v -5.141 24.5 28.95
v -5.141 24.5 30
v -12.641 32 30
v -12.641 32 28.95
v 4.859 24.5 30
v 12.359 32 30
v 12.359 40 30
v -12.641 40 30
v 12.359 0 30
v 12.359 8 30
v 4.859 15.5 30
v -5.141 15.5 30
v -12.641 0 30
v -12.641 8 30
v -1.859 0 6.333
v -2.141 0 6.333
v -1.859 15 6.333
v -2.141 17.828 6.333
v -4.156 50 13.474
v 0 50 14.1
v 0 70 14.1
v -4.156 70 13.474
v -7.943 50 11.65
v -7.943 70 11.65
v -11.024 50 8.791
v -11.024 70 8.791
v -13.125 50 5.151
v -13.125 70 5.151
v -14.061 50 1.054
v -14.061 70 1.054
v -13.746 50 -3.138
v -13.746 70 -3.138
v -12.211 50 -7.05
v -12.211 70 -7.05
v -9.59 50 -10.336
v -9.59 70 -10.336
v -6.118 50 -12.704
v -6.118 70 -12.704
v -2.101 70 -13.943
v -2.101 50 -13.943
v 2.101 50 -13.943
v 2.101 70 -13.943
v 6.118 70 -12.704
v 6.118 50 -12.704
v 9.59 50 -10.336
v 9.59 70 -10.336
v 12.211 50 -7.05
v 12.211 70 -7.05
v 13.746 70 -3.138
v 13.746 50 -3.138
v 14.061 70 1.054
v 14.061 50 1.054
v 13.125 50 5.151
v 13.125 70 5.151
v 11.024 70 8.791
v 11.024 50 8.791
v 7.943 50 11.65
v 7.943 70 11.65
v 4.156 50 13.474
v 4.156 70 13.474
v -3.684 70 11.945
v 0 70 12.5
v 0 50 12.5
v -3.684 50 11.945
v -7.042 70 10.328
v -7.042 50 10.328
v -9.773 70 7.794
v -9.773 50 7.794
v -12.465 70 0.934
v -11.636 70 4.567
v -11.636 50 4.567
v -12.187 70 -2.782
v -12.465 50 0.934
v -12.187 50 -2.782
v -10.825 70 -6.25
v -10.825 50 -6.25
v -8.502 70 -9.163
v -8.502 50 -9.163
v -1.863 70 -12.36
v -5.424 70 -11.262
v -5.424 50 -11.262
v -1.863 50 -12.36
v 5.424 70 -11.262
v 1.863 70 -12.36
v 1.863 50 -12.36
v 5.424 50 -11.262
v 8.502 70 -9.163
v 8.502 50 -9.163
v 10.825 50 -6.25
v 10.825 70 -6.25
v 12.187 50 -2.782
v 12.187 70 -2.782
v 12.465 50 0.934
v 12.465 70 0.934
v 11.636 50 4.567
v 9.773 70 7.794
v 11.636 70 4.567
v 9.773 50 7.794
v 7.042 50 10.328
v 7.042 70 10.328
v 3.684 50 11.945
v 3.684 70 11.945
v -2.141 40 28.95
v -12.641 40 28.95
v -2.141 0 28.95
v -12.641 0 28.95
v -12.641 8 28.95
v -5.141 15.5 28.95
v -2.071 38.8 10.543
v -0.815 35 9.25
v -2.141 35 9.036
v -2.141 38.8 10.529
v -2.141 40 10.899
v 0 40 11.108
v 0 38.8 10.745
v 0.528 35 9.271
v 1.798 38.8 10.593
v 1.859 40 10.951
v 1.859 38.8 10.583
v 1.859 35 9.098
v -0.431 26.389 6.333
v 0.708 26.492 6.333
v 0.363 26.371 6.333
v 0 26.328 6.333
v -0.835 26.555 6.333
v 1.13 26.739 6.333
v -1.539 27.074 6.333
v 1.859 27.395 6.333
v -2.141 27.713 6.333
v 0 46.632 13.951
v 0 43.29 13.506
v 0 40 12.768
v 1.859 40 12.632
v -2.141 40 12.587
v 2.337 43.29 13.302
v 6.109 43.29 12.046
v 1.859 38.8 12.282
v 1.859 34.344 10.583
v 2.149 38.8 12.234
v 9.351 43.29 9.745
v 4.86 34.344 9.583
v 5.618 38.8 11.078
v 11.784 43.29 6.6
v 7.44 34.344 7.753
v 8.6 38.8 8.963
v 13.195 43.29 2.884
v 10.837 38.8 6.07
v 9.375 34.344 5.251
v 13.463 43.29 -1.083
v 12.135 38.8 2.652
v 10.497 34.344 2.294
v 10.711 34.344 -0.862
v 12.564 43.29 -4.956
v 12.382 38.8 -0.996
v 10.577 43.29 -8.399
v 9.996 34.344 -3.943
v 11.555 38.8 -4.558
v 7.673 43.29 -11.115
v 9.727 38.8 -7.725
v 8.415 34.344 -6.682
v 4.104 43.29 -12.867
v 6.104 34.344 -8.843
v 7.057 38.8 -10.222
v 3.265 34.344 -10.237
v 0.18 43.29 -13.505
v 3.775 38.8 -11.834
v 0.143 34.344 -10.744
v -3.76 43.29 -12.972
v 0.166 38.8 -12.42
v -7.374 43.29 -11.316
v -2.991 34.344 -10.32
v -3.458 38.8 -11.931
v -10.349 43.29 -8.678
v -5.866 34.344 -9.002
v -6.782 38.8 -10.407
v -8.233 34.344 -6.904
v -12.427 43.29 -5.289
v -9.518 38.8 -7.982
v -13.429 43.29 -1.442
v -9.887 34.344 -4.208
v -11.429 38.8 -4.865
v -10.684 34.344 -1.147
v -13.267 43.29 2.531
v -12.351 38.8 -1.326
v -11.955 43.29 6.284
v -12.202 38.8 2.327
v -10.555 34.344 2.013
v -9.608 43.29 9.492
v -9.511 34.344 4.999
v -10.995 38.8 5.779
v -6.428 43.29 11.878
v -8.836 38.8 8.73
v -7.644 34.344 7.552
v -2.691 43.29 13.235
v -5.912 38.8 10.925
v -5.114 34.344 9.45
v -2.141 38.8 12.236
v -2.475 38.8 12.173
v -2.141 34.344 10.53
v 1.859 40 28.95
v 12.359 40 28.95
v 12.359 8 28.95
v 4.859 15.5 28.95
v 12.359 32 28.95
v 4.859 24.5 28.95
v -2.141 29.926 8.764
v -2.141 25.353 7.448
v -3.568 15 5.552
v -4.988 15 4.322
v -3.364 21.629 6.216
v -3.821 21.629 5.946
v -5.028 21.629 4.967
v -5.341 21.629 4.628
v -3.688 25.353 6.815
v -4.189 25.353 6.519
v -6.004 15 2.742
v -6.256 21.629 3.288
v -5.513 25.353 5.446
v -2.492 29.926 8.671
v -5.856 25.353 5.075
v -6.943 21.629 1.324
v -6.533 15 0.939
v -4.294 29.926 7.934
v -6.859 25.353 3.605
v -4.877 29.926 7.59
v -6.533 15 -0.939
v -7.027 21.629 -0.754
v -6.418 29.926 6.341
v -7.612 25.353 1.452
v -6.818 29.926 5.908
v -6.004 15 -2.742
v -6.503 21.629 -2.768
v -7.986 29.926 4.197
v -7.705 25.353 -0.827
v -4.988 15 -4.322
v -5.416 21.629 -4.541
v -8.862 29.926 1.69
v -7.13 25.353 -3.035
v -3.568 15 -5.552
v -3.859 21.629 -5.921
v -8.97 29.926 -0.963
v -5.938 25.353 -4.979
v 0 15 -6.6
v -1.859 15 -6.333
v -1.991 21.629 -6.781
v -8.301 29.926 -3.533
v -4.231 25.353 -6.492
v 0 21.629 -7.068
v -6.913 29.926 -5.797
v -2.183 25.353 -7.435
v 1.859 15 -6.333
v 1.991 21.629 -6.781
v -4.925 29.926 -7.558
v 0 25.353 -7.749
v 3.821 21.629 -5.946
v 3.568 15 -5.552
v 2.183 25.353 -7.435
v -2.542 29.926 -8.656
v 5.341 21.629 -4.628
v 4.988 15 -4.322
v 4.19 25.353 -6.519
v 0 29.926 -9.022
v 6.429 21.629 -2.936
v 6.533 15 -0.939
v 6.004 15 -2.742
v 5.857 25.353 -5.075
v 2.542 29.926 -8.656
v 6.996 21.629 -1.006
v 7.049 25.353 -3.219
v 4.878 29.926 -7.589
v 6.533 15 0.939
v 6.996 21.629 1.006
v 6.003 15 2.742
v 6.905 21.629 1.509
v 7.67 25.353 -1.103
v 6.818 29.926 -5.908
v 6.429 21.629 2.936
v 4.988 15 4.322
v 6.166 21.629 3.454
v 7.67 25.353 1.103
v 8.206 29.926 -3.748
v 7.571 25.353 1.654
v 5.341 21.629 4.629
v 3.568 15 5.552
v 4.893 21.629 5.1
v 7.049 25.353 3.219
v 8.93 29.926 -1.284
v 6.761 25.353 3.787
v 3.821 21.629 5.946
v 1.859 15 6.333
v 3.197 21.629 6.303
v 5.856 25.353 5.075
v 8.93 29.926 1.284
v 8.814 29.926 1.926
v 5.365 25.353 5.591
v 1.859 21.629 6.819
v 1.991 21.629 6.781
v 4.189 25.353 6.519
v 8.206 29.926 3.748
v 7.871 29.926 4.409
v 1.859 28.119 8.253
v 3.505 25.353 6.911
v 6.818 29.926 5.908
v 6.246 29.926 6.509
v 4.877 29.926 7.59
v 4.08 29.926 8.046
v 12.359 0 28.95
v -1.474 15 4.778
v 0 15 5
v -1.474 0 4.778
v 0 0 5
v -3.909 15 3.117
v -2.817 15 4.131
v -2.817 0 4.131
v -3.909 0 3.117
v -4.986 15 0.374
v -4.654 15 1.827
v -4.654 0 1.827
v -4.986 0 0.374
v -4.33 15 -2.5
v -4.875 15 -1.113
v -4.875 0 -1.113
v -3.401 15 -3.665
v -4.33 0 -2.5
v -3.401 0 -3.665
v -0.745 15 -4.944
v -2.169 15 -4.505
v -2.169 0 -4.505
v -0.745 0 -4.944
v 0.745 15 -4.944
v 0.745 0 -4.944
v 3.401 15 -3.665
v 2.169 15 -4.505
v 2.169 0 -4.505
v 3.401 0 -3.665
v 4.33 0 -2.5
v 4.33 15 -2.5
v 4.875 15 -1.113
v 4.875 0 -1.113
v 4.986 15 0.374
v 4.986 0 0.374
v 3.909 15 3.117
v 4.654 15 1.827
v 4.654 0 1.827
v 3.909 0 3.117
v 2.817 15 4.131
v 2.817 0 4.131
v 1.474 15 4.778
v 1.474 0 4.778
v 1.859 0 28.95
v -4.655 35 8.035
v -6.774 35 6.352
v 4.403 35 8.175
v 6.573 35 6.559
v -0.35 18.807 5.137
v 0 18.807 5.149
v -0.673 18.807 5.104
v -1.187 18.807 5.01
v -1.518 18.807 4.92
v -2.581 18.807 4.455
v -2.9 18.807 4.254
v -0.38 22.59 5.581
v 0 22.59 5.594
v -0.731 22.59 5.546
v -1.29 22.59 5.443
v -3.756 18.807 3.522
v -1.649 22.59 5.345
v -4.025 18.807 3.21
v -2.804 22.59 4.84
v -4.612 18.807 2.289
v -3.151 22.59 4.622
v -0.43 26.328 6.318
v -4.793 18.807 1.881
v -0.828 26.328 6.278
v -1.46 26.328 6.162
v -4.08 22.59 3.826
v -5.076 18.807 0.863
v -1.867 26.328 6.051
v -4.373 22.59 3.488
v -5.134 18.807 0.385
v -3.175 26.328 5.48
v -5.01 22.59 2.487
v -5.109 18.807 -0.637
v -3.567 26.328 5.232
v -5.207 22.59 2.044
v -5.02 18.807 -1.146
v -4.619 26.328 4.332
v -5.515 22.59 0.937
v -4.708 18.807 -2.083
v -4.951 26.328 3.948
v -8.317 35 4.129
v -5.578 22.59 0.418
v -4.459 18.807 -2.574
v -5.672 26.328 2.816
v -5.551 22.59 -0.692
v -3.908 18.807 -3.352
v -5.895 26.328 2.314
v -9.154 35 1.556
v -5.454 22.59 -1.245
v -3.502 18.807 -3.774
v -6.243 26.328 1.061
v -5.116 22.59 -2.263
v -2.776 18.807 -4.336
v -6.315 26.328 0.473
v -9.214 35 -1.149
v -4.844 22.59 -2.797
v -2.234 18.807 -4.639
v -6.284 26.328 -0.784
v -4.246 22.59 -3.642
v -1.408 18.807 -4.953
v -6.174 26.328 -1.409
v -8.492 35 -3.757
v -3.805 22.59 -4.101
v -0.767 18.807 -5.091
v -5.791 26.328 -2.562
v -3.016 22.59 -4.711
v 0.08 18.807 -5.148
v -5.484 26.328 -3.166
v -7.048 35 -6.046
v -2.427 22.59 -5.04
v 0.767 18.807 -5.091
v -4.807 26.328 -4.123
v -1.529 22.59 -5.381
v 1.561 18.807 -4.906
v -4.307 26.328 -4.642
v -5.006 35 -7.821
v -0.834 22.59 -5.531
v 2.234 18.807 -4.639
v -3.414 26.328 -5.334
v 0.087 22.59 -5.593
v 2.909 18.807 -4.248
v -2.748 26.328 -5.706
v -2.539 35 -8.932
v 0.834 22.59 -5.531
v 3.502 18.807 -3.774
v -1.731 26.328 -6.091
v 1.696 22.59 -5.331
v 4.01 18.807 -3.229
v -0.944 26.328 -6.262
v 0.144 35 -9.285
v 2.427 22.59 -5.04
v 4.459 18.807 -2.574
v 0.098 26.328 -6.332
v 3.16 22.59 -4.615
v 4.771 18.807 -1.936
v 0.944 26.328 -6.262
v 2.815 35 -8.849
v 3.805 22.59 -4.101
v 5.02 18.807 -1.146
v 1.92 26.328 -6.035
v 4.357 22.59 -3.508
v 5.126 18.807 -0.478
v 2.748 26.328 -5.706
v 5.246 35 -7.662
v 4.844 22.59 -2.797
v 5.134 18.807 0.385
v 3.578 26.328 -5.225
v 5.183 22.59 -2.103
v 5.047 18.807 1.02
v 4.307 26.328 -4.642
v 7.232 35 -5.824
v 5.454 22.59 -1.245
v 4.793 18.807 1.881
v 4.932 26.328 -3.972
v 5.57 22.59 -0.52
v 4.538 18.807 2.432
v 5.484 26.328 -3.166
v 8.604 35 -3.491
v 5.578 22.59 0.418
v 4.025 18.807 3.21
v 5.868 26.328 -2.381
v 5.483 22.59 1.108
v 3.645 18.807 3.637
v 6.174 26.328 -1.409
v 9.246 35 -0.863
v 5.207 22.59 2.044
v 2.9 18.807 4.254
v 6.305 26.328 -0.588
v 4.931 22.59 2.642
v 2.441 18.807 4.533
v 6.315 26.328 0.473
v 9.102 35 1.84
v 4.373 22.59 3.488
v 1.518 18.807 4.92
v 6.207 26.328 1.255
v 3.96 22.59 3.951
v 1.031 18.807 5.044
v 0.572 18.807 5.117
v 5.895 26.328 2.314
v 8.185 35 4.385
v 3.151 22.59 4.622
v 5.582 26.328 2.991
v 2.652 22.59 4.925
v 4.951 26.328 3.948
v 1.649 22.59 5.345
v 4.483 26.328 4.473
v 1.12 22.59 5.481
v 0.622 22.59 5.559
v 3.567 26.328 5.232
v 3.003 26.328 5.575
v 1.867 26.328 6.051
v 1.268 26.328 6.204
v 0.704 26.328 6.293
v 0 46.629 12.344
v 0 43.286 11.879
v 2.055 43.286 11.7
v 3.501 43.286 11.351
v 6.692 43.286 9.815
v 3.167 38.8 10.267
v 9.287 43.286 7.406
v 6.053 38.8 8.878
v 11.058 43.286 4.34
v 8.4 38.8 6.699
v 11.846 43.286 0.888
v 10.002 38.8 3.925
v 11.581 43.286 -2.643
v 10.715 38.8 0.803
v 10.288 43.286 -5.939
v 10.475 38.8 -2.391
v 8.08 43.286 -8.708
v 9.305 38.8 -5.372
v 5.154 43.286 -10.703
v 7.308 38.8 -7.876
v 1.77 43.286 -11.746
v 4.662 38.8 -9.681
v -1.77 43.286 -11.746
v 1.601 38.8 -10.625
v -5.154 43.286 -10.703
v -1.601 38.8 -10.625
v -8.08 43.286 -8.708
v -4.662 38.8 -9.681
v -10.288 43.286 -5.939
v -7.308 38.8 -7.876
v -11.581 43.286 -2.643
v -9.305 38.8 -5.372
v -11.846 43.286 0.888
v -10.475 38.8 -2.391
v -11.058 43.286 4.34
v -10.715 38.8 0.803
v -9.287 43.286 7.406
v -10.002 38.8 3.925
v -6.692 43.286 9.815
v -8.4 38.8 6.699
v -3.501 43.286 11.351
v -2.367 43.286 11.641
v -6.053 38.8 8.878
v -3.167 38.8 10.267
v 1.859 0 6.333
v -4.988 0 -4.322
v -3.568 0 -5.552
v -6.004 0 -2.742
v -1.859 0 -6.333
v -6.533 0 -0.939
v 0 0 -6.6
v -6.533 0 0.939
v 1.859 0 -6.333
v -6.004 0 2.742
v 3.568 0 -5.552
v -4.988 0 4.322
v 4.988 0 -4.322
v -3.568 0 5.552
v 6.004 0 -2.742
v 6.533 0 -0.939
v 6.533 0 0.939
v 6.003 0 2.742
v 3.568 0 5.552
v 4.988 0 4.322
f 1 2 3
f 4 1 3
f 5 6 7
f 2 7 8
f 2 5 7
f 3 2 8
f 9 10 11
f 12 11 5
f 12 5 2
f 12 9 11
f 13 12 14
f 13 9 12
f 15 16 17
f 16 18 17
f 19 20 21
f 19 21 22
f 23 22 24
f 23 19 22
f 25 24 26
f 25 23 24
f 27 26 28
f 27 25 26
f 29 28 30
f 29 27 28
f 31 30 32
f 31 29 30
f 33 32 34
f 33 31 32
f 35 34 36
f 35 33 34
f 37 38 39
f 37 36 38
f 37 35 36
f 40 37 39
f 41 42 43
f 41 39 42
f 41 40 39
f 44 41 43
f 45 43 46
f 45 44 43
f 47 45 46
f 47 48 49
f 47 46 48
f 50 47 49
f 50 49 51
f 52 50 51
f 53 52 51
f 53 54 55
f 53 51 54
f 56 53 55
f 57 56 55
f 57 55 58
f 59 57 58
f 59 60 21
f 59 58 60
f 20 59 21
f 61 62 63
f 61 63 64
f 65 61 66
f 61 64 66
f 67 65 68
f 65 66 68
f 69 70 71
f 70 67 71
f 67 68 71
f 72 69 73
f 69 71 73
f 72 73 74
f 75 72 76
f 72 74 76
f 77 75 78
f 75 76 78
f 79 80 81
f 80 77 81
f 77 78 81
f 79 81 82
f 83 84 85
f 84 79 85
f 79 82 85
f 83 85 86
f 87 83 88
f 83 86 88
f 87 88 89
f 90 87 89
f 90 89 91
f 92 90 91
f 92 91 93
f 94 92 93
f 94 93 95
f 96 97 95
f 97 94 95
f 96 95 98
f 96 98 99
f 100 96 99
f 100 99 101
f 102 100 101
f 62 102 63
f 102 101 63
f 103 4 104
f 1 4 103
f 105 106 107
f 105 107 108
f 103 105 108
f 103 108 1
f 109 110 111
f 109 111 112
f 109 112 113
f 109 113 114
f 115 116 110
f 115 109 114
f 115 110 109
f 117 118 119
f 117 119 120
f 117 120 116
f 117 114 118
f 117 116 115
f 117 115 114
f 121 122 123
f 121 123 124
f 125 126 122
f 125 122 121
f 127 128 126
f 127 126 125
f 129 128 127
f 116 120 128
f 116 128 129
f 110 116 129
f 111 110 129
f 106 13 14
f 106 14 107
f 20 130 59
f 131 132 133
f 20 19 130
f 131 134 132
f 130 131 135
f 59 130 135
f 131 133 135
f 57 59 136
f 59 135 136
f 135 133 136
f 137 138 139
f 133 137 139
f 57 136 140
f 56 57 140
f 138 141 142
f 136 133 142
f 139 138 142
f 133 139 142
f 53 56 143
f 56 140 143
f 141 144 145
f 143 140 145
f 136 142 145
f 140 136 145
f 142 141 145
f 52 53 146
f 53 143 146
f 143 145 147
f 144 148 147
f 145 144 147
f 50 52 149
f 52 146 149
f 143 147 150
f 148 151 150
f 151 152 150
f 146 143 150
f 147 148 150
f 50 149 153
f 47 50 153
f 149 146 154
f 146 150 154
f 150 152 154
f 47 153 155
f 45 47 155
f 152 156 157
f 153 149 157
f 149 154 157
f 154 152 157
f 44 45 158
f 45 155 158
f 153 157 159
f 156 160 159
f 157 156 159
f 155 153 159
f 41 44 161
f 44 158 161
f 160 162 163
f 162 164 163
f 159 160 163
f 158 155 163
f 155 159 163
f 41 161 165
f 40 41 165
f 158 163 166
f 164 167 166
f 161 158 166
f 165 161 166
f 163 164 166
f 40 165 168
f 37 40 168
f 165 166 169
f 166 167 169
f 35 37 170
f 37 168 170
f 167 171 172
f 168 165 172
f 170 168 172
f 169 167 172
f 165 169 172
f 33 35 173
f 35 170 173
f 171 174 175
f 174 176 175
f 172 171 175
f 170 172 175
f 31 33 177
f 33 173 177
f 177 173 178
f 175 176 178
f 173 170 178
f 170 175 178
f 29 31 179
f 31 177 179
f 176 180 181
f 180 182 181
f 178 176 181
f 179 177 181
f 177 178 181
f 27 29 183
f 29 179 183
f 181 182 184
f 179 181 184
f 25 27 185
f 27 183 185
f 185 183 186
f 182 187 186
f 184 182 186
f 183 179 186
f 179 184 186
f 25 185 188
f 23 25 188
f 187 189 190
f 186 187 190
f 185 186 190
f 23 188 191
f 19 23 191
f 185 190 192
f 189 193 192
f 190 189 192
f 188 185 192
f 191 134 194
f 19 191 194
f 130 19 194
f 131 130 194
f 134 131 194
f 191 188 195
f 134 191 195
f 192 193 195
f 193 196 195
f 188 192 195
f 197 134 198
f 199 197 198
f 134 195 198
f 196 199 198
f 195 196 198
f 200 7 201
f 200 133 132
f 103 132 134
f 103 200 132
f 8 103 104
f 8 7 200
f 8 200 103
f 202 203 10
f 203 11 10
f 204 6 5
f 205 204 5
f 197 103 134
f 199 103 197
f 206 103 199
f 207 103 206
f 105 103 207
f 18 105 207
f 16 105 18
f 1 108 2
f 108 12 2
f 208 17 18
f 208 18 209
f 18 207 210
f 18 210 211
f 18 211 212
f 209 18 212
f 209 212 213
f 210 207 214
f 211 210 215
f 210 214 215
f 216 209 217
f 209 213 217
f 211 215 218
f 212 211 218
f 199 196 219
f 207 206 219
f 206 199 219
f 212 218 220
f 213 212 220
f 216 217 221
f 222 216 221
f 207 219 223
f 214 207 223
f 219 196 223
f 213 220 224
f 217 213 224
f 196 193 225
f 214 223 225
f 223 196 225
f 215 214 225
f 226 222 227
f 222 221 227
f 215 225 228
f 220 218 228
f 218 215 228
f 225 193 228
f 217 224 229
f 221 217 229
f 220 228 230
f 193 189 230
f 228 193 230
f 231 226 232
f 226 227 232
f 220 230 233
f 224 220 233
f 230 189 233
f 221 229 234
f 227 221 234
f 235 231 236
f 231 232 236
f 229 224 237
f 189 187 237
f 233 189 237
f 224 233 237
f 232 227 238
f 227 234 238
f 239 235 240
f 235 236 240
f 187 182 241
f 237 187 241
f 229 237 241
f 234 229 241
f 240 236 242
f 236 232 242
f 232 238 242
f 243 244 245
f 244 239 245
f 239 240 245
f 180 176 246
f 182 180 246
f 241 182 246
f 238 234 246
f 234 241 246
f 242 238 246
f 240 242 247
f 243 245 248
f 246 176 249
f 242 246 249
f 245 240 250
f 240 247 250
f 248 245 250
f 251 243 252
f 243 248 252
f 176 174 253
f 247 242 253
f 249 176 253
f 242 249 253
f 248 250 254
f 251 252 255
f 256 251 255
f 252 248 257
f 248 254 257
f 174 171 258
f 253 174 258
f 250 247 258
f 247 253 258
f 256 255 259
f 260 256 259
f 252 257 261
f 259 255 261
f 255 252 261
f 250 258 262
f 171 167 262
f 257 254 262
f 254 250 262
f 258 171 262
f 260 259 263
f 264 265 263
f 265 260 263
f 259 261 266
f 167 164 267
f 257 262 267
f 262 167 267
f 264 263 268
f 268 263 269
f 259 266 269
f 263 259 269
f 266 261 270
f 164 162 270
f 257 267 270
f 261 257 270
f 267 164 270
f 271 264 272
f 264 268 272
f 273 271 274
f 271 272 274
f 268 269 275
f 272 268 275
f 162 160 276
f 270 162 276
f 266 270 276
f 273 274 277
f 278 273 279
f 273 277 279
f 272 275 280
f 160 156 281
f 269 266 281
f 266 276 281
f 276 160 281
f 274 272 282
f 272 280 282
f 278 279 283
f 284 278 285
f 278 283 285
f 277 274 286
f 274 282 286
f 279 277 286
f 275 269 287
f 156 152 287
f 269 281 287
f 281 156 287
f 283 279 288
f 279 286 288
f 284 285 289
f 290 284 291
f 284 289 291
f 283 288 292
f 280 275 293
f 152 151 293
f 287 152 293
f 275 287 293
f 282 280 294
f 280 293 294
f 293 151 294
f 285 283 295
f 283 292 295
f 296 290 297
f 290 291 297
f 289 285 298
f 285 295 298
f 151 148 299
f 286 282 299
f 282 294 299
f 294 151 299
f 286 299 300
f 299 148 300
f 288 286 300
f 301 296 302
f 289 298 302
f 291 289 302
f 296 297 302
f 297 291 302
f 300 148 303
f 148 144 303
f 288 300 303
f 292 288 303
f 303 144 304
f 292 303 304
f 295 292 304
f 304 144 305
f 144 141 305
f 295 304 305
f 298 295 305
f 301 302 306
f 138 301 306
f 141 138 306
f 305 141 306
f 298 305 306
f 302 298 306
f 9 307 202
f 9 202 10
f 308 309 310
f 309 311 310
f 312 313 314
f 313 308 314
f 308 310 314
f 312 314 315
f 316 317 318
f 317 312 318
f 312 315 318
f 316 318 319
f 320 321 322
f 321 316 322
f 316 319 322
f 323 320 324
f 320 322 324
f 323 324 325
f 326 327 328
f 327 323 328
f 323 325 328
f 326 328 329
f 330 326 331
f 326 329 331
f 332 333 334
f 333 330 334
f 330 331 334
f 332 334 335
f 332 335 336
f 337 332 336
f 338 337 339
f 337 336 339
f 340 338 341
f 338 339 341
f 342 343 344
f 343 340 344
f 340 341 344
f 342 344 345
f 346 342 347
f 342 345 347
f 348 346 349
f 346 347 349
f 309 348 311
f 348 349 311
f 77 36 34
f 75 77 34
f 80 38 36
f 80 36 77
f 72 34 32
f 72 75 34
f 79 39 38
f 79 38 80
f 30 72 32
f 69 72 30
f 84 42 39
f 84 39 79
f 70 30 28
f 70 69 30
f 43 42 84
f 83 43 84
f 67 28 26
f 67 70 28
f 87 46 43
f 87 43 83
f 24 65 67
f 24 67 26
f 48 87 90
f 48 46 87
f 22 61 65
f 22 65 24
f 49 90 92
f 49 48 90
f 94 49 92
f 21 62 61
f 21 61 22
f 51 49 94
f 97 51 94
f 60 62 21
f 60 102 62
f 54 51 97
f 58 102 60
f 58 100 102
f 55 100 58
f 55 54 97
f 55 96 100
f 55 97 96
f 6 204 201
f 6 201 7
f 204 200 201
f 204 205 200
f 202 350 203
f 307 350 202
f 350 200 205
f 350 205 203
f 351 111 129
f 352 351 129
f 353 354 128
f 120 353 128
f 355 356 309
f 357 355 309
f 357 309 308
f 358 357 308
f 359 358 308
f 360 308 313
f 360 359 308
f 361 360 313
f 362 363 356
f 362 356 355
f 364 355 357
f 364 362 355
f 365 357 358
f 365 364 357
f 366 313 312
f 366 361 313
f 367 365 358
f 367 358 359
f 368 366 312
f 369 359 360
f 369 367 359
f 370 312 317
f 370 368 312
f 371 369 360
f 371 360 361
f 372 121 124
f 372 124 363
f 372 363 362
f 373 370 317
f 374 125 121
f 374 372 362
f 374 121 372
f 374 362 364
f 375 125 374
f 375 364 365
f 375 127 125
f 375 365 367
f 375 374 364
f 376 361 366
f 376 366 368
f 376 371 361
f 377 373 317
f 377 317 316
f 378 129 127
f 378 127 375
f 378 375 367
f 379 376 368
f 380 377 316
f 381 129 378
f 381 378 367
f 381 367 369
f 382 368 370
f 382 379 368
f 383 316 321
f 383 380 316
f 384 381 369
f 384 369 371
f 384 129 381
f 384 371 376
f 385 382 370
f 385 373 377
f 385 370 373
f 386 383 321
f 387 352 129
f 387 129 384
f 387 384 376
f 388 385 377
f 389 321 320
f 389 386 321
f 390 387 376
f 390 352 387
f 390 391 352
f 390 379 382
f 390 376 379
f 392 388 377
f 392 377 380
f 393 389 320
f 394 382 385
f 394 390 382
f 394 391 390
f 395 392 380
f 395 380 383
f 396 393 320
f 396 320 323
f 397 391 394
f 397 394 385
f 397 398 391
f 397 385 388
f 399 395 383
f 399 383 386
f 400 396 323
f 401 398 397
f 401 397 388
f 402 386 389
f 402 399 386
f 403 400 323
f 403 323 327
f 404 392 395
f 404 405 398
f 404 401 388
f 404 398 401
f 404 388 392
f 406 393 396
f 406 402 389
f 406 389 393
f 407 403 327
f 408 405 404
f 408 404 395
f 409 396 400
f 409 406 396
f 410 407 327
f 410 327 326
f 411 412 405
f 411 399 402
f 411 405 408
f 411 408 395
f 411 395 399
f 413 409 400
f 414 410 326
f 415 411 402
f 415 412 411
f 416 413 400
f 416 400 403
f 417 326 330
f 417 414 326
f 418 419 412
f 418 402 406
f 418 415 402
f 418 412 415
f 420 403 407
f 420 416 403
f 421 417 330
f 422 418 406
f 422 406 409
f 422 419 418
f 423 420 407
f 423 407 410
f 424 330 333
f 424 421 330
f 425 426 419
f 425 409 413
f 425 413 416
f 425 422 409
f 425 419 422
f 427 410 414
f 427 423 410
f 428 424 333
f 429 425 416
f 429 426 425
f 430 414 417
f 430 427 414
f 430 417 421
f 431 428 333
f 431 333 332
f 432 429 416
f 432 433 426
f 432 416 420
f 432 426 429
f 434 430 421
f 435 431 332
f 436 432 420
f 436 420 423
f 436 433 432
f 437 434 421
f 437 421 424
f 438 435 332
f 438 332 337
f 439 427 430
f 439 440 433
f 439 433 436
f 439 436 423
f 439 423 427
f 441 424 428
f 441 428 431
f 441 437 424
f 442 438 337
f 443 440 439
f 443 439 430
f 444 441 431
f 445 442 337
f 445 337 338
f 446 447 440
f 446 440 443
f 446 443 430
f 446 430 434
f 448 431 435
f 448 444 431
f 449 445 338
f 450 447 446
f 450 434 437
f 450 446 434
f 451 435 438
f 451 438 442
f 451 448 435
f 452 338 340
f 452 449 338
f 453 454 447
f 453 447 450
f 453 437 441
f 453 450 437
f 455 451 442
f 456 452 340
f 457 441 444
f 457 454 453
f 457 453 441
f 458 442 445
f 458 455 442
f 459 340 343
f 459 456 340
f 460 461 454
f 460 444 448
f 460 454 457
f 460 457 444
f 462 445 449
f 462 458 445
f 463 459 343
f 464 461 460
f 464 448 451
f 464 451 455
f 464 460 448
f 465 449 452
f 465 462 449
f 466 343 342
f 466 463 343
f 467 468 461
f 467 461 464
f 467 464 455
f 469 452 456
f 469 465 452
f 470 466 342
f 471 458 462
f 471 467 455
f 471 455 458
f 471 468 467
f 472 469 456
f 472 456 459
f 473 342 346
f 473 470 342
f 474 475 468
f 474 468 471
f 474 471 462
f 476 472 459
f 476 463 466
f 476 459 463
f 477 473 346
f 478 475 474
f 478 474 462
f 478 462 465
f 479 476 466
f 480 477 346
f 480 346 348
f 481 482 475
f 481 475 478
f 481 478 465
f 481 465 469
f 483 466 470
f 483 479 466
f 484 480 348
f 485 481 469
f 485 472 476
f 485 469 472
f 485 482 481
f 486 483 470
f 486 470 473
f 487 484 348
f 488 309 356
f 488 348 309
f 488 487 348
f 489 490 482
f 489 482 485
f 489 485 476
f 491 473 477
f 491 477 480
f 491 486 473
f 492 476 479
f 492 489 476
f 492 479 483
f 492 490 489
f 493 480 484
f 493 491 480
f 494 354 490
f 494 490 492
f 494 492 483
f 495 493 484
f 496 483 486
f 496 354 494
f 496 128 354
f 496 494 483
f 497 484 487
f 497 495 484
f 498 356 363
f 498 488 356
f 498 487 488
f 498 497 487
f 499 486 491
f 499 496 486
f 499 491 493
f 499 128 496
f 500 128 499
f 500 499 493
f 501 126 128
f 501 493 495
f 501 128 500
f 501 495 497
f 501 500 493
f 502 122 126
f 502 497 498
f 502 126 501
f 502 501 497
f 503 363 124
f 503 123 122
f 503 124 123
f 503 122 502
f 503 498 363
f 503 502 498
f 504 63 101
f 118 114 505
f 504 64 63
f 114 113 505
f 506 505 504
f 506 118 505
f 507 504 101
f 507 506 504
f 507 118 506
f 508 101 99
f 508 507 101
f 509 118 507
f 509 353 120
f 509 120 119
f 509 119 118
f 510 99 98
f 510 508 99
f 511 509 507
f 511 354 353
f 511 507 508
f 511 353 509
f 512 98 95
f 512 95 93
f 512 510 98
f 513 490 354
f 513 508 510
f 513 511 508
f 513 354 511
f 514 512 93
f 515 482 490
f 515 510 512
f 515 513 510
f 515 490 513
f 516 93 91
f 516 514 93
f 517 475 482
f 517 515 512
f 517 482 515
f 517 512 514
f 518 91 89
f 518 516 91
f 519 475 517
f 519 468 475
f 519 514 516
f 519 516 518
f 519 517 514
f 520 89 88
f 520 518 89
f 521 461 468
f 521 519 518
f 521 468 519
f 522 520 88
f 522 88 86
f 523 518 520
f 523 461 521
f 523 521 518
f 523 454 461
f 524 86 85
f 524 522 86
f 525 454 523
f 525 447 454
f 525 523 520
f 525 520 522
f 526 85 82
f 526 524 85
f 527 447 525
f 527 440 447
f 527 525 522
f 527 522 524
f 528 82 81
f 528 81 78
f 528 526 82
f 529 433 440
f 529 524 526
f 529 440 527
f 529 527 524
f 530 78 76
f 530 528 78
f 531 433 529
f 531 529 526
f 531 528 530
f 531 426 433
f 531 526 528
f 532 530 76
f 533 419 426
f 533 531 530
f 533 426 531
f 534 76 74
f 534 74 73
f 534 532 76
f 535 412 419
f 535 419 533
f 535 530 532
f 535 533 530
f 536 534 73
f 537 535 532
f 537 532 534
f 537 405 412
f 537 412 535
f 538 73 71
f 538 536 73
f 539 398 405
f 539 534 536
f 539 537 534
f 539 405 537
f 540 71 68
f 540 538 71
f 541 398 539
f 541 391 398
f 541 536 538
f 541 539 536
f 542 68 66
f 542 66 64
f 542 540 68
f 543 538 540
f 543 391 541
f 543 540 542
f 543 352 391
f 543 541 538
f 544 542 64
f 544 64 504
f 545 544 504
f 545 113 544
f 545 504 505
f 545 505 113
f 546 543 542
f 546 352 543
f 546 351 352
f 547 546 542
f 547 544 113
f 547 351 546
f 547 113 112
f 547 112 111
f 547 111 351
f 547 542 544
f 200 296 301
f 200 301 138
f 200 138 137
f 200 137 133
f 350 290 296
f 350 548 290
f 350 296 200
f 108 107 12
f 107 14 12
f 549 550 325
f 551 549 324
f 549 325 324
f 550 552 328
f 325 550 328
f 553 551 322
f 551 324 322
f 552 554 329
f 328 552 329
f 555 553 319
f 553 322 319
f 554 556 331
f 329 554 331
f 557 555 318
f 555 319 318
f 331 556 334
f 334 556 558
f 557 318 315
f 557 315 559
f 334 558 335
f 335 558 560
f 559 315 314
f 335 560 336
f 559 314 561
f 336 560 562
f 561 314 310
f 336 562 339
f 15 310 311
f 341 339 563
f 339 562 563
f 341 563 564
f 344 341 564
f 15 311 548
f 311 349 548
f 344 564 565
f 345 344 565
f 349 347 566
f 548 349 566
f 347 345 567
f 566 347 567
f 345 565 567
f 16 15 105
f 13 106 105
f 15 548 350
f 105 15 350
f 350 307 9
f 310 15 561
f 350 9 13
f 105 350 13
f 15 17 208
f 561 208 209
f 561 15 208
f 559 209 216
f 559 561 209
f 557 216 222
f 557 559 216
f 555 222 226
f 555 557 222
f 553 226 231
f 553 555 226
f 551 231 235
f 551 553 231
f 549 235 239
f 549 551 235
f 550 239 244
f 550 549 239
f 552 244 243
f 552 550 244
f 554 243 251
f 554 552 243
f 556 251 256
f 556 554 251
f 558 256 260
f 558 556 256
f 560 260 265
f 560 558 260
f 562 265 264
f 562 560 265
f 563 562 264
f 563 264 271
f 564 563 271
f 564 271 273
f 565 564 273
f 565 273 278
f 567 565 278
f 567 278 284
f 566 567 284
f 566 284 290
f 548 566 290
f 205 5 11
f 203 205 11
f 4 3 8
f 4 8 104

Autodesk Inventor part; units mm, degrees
ref_plane "YZ Plane" through (0, 0, 0) normal (1, 0, 0) x (0, 1, 0)
ref_plane "XZ Plane" through (0, 0, 0) normal (0, 1, 0) x (-1, 0, 0)
ref_plane "XY Plane" through (0, 0, 0) normal (0, 0, 1) x (1, 0, 0)
sketch "Szkic1" plane through (0, 0, 0) normal (1, 0, 0) x (0, 1, 0)
  line L0 (70, 12.5) -> (50, 12.5)
  arc A0 (50, 12.5) -> (35, 9.2857) centre (50, -24.1071) ccw
  arc A1 (15, 5) -> (35, 9.2857) centre (15, 53.8095) ccw
  line L1 (15, 5) -> (0, 5)
  line L2 (0.9785, 0) -> (128.1793, 0) construction
  line L3 (70, 14.1) -> (50, 14.1)
  arc A2 (50, 14.1) -> (34.3444, 10.7452) centre (50, -24.1071) ccw
  arc A3 (15, 6.6) -> (34.3444, 10.7452) centre (15, 53.8095) ccw
  line L4 (15, 6.6) -> (0, 6.6)
  line L5 (70, 14.1) -> (70, 12.5)
  line L6 (0, 6.6) -> (0, 5)
  line L7 (-25.6359, 0) -> (153.8152, 0) projected
  line L8 (70, 14.1) -> (70, 0)
  line L9 (0, 0) -> (0, 5)
  dimension "d35" = 5
  dimension "d36" = 12.5
  dimension "d37" = 70
  dimension "d38" = 20
  dimension "d39" = 15
  dimension "d40" = 20
  dimension "d41" = 1.6
revolve "Obrót1" add sketch "Szkic1" angle 360 about axis through (0, -10, 0) along (0, 1, 0) contours L0 A0 A1 L1 L6 L4 A3 A2 L3 L5
sketch "Szkic3" plane through (0, 0, 0) normal (0, 1, 0) x (-1, 0, 0)
  line L0 (2.1408, 6.3327) -> (-1.8592, 6.3327)
  line L1 (-1.8592, 6.3327) -> (-1.8592, 28.95)
  line L2 (-1.8592, 28.95) -> (2.1408, 28.95)
  line L3 (2.1408, 28.95) -> (2.1408, 6.3327)
  line L4 (-12.3592, 30) -> (12.6408, 30)
  line L5 (12.6408, 30) -> (12.6408, 28.95)
  line L6 (12.6408, 28.95) -> (-12.3592, 28.95)
  line L7 (-12.3592, 28.95) -> (-12.3592, 30)
  circle A0 centre (0, 0) radius 12.5 projected
  line L8 (2.1408, 12.3153) -> (-1.8592, 12.361)
  circle A1 centre (0, 0) radius 6.6 projected
  point P0 (0.1408, 28.95)
  point P1 (0.1408, 30)
  point P2 (2.1408, 28.95)
  point P3 (-1.8592, 28.95)
  dimension "d17" = 4
  dimension "d19" = 1.05
  dimension "d20" = 25
  dimension "d21" = 30
extrude "Wyciągnięcie proste2" add sketch "Szkic3" along normal blind 40 contours L2 L6 L7 L4 L5
extrude "Wyciągnięcie proste3" add sketch "Szkic3" along normal blind 40 contours L0 A1 L1 L8 L3 | L0 A1 | A0 L1 L2 L3 | L8 A0 picked at (0.2091, 6.4118)
sketch "Szkic4" plane through (0, 40, 0) normal (0, 1, 0) x (1, 0, 0)
  line L0 (-12.6408, -30) -> (12.3592, -30) projected
  line L1 (1.9943, -30) -> (-2.1408, -30)
  line L2 (-2.1408, -5) -> (1.8592, -5)
  line L3 (-2.1408, -30) -> (1.8592, -30)
  line L4 (1.8592, -30) -> (1.8592, -5)
  line L5 (1.8592, -5) -> (-2.1408, -5)
  line L6 (-2.1408, -5) -> (-2.1408, -30)
  point P0 (0, 0)
  point P1 (-2, -5)
  point P2 (-2, -5)
  point P3 (-0.1408, -30)
  dimension "d42" = 4
  dimension "d43" = 25
extrude "Wyciągnięcie proste4" add sketch "Szkic4" against normal blind 1.2
sketch "Szkic5" plane through (-12.6408, 0, 30) normal (0, 0, 1) x (1, 0, 0)
  line L0 (0, 0) -> (25, 0) projected
  line L1 (0, 0) -> (0, 8)
  line L2 (0, 0) -> (0, 40) projected
  line L3 (0, 8) -> (7.5, 15.5)
  line L4 (7.5, 15.5) -> (7.5, 24.5)
  line L5 (9.5, 70) -> (9.5, 0) projected
  line L6 (7.5, 24.5) -> (0, 32)
  line L7 (0, 40) -> (25, 40) projected
  line L8 (0, 32) -> (0, 40)
  line L9 (0, 40) -> (25, 40)
  line L10 (25, 0) -> (25, 40) projected
  line L11 (25, 40) -> (25, 32)
  line L12 (25, 32) -> (17.5, 24.5)
  line L13 (17.5, 24.5) -> (17.5, 15.5)
  line L14 (17.5, 15.5) -> (25, 8)
  line L15 (25, 8) -> (25, 0)
  line L16 (0, 0) -> (25, 0)
  line L17 (12.5, 0) -> (12.5, 40) construction
  line L18 (14.4324, 40) -> (10.5676, 40) construction
  point P0 (12.6408, 0)
  dimension "d29" = 45
  dimension "d30" = 10
  dimension "d31" = 8
  dimension "d32" = 8
extrude "Wyciągnięcie proste5" cut sketch "Szkic5" against normal blind 1.2 contours L2 L6 L4 L3 | L14 L13 L12 L10
revolve "Obrót2" cut sketch "Szkic1" angle 360 about axis through (0, 0.9785, 0) along (0, 1, 0) contours L8 L7 L9 L1 A1 A0 L0
properties part number "rurka_optv2"
